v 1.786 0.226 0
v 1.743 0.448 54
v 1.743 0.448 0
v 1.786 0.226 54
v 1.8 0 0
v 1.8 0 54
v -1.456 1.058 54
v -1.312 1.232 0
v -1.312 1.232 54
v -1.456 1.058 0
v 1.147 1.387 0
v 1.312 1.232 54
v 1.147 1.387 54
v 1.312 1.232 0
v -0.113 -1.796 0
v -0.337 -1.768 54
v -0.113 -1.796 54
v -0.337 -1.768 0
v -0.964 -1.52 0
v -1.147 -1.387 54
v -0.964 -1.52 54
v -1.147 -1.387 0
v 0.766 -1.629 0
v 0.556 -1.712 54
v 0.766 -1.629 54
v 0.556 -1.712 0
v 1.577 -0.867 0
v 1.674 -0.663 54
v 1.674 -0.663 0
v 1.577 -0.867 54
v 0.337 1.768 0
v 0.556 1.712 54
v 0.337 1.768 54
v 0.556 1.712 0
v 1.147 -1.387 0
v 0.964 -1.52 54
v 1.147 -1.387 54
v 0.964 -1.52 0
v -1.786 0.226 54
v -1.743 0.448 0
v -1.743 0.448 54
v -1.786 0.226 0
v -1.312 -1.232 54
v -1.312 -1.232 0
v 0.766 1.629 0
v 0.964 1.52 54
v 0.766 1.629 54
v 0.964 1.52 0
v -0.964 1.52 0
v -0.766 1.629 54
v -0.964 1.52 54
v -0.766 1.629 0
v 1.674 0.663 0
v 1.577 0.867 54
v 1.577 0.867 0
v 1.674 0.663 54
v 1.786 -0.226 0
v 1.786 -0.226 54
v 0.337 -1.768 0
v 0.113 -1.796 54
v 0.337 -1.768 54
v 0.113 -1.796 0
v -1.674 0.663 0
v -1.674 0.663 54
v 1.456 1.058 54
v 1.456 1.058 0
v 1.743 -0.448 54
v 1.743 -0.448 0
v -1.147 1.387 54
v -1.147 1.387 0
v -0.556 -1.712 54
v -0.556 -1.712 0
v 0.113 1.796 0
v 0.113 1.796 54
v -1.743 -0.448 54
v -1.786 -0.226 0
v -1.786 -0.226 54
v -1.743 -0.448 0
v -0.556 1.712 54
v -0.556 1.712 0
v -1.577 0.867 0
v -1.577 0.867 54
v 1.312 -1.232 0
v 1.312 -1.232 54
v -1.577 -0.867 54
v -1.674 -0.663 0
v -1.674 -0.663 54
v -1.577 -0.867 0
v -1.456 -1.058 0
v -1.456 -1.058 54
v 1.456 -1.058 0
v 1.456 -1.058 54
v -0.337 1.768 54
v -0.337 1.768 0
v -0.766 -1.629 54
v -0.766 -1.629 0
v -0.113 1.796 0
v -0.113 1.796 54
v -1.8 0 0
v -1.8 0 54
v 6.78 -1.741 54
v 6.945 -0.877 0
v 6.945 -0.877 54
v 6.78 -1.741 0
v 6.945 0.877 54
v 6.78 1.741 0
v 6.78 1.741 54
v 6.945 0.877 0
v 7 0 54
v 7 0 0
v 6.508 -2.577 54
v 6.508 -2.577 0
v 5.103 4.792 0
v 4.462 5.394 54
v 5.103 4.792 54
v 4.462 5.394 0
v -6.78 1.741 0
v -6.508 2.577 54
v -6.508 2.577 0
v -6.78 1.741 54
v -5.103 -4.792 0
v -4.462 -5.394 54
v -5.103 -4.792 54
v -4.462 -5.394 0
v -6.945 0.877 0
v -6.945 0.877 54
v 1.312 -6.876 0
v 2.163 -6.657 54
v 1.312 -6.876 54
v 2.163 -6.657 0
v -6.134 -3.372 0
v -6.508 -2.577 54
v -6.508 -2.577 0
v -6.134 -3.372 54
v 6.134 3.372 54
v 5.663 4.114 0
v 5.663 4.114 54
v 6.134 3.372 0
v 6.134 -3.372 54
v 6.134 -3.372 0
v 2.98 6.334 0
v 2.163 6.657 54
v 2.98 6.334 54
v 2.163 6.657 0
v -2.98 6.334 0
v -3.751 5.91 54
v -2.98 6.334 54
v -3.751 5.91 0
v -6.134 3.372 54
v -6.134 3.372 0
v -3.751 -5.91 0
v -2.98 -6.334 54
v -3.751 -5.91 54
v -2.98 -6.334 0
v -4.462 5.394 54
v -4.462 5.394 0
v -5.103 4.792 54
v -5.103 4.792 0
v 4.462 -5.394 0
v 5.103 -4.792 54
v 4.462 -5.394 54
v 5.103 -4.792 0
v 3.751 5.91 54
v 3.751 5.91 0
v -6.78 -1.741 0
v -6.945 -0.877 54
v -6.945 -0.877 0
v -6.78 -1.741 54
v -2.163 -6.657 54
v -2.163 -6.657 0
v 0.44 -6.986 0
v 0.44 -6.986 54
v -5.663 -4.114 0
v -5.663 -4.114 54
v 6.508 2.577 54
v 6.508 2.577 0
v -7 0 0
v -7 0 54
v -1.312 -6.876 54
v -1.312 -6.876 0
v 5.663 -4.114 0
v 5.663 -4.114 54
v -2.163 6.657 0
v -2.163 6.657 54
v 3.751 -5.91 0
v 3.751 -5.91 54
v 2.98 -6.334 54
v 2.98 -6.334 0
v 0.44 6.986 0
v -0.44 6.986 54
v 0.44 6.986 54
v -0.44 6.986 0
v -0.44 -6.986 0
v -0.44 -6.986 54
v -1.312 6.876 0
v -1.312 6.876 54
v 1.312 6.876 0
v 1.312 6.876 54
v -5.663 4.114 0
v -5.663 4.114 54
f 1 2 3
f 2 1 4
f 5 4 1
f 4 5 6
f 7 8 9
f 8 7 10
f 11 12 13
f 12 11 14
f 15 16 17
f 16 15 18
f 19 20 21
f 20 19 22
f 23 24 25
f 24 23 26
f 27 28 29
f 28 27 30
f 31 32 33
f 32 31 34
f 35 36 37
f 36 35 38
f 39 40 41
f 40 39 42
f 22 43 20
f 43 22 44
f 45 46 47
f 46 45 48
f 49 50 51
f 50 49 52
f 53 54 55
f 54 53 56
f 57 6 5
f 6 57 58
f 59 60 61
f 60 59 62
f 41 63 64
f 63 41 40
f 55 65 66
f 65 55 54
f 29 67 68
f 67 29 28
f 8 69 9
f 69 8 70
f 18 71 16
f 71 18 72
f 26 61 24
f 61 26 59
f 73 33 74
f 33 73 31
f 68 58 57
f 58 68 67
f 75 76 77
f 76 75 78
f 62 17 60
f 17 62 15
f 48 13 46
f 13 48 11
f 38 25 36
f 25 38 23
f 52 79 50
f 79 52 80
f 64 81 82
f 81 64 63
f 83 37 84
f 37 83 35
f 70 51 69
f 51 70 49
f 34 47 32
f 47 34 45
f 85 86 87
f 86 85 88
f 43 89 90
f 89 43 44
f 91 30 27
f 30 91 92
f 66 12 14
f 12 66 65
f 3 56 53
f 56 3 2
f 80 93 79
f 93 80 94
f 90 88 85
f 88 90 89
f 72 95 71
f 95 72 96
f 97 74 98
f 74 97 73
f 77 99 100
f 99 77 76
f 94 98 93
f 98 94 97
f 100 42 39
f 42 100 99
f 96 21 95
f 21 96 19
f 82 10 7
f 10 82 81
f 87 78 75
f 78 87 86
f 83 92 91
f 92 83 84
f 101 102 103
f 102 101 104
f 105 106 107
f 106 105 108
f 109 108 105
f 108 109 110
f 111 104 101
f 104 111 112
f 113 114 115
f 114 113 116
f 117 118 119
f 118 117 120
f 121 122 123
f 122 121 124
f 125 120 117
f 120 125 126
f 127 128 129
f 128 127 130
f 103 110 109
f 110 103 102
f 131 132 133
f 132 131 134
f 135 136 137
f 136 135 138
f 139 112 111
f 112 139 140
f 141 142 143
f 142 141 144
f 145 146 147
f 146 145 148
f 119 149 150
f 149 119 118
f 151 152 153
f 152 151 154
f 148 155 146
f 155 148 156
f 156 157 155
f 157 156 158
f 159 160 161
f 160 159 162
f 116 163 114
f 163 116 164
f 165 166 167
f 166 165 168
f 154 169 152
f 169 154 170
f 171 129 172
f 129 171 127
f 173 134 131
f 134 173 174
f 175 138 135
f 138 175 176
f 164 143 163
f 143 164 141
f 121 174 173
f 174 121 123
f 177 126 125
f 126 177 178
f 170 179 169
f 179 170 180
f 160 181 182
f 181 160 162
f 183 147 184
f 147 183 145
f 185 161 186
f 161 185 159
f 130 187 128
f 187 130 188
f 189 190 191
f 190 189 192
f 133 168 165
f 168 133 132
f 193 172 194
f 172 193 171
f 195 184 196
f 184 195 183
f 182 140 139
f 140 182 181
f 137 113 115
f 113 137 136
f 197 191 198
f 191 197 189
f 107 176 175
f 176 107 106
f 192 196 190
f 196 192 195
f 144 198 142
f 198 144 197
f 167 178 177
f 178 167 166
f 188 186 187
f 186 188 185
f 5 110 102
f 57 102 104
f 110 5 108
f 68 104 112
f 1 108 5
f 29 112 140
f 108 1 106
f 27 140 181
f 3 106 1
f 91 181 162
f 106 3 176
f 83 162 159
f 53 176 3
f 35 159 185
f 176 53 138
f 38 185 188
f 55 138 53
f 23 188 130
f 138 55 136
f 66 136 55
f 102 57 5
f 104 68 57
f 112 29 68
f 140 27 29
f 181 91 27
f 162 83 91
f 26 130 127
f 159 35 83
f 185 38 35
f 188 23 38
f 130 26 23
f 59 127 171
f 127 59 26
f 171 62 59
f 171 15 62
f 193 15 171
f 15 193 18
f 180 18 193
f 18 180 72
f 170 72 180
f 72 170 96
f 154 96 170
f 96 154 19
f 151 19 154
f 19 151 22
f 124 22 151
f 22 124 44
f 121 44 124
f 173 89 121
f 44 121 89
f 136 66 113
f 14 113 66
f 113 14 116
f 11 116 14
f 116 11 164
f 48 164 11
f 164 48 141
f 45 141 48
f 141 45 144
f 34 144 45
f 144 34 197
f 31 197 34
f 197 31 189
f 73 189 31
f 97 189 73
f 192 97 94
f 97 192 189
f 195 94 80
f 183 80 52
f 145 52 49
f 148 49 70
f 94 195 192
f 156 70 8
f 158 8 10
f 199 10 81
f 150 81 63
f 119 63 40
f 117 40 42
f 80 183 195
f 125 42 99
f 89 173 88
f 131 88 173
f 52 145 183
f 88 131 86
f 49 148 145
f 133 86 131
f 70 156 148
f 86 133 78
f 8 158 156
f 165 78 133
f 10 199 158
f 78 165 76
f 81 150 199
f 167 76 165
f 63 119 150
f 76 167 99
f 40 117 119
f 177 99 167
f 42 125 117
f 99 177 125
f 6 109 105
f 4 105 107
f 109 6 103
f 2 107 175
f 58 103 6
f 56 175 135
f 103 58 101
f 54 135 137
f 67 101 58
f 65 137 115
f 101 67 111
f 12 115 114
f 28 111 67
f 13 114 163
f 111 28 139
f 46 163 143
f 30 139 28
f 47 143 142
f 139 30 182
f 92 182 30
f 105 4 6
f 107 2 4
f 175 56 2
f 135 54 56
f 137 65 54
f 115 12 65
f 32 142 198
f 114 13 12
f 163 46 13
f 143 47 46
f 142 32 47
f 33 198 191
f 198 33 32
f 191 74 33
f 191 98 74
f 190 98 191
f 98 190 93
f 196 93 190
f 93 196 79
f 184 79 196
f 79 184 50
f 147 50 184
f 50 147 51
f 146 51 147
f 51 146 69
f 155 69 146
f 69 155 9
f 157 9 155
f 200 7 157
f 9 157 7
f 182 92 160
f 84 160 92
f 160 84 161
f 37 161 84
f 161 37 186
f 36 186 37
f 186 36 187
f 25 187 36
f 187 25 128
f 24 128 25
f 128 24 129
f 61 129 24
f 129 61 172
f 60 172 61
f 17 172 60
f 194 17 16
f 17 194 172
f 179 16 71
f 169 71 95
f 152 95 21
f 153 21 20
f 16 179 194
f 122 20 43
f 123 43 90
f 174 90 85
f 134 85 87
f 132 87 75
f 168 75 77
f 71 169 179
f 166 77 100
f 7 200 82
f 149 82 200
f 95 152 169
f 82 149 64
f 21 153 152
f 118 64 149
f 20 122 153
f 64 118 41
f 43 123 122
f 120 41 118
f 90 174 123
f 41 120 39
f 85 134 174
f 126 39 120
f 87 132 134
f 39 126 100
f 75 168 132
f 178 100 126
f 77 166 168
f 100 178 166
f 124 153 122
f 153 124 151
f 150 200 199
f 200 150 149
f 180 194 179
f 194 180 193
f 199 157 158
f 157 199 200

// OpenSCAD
$fn = 50;


difference() {
	union() {
		cylinder(h = 54, r = 7.0000000000);
	}
	union() {
		translate(v = [0, 0, -100]) {
			cylinder(h = 200, r = 1.8000000000);
		}
		translate(v = [0, 0, -100]) {
			cylinder(h = 200, r = 1.8000000000);
		}
	}
}
